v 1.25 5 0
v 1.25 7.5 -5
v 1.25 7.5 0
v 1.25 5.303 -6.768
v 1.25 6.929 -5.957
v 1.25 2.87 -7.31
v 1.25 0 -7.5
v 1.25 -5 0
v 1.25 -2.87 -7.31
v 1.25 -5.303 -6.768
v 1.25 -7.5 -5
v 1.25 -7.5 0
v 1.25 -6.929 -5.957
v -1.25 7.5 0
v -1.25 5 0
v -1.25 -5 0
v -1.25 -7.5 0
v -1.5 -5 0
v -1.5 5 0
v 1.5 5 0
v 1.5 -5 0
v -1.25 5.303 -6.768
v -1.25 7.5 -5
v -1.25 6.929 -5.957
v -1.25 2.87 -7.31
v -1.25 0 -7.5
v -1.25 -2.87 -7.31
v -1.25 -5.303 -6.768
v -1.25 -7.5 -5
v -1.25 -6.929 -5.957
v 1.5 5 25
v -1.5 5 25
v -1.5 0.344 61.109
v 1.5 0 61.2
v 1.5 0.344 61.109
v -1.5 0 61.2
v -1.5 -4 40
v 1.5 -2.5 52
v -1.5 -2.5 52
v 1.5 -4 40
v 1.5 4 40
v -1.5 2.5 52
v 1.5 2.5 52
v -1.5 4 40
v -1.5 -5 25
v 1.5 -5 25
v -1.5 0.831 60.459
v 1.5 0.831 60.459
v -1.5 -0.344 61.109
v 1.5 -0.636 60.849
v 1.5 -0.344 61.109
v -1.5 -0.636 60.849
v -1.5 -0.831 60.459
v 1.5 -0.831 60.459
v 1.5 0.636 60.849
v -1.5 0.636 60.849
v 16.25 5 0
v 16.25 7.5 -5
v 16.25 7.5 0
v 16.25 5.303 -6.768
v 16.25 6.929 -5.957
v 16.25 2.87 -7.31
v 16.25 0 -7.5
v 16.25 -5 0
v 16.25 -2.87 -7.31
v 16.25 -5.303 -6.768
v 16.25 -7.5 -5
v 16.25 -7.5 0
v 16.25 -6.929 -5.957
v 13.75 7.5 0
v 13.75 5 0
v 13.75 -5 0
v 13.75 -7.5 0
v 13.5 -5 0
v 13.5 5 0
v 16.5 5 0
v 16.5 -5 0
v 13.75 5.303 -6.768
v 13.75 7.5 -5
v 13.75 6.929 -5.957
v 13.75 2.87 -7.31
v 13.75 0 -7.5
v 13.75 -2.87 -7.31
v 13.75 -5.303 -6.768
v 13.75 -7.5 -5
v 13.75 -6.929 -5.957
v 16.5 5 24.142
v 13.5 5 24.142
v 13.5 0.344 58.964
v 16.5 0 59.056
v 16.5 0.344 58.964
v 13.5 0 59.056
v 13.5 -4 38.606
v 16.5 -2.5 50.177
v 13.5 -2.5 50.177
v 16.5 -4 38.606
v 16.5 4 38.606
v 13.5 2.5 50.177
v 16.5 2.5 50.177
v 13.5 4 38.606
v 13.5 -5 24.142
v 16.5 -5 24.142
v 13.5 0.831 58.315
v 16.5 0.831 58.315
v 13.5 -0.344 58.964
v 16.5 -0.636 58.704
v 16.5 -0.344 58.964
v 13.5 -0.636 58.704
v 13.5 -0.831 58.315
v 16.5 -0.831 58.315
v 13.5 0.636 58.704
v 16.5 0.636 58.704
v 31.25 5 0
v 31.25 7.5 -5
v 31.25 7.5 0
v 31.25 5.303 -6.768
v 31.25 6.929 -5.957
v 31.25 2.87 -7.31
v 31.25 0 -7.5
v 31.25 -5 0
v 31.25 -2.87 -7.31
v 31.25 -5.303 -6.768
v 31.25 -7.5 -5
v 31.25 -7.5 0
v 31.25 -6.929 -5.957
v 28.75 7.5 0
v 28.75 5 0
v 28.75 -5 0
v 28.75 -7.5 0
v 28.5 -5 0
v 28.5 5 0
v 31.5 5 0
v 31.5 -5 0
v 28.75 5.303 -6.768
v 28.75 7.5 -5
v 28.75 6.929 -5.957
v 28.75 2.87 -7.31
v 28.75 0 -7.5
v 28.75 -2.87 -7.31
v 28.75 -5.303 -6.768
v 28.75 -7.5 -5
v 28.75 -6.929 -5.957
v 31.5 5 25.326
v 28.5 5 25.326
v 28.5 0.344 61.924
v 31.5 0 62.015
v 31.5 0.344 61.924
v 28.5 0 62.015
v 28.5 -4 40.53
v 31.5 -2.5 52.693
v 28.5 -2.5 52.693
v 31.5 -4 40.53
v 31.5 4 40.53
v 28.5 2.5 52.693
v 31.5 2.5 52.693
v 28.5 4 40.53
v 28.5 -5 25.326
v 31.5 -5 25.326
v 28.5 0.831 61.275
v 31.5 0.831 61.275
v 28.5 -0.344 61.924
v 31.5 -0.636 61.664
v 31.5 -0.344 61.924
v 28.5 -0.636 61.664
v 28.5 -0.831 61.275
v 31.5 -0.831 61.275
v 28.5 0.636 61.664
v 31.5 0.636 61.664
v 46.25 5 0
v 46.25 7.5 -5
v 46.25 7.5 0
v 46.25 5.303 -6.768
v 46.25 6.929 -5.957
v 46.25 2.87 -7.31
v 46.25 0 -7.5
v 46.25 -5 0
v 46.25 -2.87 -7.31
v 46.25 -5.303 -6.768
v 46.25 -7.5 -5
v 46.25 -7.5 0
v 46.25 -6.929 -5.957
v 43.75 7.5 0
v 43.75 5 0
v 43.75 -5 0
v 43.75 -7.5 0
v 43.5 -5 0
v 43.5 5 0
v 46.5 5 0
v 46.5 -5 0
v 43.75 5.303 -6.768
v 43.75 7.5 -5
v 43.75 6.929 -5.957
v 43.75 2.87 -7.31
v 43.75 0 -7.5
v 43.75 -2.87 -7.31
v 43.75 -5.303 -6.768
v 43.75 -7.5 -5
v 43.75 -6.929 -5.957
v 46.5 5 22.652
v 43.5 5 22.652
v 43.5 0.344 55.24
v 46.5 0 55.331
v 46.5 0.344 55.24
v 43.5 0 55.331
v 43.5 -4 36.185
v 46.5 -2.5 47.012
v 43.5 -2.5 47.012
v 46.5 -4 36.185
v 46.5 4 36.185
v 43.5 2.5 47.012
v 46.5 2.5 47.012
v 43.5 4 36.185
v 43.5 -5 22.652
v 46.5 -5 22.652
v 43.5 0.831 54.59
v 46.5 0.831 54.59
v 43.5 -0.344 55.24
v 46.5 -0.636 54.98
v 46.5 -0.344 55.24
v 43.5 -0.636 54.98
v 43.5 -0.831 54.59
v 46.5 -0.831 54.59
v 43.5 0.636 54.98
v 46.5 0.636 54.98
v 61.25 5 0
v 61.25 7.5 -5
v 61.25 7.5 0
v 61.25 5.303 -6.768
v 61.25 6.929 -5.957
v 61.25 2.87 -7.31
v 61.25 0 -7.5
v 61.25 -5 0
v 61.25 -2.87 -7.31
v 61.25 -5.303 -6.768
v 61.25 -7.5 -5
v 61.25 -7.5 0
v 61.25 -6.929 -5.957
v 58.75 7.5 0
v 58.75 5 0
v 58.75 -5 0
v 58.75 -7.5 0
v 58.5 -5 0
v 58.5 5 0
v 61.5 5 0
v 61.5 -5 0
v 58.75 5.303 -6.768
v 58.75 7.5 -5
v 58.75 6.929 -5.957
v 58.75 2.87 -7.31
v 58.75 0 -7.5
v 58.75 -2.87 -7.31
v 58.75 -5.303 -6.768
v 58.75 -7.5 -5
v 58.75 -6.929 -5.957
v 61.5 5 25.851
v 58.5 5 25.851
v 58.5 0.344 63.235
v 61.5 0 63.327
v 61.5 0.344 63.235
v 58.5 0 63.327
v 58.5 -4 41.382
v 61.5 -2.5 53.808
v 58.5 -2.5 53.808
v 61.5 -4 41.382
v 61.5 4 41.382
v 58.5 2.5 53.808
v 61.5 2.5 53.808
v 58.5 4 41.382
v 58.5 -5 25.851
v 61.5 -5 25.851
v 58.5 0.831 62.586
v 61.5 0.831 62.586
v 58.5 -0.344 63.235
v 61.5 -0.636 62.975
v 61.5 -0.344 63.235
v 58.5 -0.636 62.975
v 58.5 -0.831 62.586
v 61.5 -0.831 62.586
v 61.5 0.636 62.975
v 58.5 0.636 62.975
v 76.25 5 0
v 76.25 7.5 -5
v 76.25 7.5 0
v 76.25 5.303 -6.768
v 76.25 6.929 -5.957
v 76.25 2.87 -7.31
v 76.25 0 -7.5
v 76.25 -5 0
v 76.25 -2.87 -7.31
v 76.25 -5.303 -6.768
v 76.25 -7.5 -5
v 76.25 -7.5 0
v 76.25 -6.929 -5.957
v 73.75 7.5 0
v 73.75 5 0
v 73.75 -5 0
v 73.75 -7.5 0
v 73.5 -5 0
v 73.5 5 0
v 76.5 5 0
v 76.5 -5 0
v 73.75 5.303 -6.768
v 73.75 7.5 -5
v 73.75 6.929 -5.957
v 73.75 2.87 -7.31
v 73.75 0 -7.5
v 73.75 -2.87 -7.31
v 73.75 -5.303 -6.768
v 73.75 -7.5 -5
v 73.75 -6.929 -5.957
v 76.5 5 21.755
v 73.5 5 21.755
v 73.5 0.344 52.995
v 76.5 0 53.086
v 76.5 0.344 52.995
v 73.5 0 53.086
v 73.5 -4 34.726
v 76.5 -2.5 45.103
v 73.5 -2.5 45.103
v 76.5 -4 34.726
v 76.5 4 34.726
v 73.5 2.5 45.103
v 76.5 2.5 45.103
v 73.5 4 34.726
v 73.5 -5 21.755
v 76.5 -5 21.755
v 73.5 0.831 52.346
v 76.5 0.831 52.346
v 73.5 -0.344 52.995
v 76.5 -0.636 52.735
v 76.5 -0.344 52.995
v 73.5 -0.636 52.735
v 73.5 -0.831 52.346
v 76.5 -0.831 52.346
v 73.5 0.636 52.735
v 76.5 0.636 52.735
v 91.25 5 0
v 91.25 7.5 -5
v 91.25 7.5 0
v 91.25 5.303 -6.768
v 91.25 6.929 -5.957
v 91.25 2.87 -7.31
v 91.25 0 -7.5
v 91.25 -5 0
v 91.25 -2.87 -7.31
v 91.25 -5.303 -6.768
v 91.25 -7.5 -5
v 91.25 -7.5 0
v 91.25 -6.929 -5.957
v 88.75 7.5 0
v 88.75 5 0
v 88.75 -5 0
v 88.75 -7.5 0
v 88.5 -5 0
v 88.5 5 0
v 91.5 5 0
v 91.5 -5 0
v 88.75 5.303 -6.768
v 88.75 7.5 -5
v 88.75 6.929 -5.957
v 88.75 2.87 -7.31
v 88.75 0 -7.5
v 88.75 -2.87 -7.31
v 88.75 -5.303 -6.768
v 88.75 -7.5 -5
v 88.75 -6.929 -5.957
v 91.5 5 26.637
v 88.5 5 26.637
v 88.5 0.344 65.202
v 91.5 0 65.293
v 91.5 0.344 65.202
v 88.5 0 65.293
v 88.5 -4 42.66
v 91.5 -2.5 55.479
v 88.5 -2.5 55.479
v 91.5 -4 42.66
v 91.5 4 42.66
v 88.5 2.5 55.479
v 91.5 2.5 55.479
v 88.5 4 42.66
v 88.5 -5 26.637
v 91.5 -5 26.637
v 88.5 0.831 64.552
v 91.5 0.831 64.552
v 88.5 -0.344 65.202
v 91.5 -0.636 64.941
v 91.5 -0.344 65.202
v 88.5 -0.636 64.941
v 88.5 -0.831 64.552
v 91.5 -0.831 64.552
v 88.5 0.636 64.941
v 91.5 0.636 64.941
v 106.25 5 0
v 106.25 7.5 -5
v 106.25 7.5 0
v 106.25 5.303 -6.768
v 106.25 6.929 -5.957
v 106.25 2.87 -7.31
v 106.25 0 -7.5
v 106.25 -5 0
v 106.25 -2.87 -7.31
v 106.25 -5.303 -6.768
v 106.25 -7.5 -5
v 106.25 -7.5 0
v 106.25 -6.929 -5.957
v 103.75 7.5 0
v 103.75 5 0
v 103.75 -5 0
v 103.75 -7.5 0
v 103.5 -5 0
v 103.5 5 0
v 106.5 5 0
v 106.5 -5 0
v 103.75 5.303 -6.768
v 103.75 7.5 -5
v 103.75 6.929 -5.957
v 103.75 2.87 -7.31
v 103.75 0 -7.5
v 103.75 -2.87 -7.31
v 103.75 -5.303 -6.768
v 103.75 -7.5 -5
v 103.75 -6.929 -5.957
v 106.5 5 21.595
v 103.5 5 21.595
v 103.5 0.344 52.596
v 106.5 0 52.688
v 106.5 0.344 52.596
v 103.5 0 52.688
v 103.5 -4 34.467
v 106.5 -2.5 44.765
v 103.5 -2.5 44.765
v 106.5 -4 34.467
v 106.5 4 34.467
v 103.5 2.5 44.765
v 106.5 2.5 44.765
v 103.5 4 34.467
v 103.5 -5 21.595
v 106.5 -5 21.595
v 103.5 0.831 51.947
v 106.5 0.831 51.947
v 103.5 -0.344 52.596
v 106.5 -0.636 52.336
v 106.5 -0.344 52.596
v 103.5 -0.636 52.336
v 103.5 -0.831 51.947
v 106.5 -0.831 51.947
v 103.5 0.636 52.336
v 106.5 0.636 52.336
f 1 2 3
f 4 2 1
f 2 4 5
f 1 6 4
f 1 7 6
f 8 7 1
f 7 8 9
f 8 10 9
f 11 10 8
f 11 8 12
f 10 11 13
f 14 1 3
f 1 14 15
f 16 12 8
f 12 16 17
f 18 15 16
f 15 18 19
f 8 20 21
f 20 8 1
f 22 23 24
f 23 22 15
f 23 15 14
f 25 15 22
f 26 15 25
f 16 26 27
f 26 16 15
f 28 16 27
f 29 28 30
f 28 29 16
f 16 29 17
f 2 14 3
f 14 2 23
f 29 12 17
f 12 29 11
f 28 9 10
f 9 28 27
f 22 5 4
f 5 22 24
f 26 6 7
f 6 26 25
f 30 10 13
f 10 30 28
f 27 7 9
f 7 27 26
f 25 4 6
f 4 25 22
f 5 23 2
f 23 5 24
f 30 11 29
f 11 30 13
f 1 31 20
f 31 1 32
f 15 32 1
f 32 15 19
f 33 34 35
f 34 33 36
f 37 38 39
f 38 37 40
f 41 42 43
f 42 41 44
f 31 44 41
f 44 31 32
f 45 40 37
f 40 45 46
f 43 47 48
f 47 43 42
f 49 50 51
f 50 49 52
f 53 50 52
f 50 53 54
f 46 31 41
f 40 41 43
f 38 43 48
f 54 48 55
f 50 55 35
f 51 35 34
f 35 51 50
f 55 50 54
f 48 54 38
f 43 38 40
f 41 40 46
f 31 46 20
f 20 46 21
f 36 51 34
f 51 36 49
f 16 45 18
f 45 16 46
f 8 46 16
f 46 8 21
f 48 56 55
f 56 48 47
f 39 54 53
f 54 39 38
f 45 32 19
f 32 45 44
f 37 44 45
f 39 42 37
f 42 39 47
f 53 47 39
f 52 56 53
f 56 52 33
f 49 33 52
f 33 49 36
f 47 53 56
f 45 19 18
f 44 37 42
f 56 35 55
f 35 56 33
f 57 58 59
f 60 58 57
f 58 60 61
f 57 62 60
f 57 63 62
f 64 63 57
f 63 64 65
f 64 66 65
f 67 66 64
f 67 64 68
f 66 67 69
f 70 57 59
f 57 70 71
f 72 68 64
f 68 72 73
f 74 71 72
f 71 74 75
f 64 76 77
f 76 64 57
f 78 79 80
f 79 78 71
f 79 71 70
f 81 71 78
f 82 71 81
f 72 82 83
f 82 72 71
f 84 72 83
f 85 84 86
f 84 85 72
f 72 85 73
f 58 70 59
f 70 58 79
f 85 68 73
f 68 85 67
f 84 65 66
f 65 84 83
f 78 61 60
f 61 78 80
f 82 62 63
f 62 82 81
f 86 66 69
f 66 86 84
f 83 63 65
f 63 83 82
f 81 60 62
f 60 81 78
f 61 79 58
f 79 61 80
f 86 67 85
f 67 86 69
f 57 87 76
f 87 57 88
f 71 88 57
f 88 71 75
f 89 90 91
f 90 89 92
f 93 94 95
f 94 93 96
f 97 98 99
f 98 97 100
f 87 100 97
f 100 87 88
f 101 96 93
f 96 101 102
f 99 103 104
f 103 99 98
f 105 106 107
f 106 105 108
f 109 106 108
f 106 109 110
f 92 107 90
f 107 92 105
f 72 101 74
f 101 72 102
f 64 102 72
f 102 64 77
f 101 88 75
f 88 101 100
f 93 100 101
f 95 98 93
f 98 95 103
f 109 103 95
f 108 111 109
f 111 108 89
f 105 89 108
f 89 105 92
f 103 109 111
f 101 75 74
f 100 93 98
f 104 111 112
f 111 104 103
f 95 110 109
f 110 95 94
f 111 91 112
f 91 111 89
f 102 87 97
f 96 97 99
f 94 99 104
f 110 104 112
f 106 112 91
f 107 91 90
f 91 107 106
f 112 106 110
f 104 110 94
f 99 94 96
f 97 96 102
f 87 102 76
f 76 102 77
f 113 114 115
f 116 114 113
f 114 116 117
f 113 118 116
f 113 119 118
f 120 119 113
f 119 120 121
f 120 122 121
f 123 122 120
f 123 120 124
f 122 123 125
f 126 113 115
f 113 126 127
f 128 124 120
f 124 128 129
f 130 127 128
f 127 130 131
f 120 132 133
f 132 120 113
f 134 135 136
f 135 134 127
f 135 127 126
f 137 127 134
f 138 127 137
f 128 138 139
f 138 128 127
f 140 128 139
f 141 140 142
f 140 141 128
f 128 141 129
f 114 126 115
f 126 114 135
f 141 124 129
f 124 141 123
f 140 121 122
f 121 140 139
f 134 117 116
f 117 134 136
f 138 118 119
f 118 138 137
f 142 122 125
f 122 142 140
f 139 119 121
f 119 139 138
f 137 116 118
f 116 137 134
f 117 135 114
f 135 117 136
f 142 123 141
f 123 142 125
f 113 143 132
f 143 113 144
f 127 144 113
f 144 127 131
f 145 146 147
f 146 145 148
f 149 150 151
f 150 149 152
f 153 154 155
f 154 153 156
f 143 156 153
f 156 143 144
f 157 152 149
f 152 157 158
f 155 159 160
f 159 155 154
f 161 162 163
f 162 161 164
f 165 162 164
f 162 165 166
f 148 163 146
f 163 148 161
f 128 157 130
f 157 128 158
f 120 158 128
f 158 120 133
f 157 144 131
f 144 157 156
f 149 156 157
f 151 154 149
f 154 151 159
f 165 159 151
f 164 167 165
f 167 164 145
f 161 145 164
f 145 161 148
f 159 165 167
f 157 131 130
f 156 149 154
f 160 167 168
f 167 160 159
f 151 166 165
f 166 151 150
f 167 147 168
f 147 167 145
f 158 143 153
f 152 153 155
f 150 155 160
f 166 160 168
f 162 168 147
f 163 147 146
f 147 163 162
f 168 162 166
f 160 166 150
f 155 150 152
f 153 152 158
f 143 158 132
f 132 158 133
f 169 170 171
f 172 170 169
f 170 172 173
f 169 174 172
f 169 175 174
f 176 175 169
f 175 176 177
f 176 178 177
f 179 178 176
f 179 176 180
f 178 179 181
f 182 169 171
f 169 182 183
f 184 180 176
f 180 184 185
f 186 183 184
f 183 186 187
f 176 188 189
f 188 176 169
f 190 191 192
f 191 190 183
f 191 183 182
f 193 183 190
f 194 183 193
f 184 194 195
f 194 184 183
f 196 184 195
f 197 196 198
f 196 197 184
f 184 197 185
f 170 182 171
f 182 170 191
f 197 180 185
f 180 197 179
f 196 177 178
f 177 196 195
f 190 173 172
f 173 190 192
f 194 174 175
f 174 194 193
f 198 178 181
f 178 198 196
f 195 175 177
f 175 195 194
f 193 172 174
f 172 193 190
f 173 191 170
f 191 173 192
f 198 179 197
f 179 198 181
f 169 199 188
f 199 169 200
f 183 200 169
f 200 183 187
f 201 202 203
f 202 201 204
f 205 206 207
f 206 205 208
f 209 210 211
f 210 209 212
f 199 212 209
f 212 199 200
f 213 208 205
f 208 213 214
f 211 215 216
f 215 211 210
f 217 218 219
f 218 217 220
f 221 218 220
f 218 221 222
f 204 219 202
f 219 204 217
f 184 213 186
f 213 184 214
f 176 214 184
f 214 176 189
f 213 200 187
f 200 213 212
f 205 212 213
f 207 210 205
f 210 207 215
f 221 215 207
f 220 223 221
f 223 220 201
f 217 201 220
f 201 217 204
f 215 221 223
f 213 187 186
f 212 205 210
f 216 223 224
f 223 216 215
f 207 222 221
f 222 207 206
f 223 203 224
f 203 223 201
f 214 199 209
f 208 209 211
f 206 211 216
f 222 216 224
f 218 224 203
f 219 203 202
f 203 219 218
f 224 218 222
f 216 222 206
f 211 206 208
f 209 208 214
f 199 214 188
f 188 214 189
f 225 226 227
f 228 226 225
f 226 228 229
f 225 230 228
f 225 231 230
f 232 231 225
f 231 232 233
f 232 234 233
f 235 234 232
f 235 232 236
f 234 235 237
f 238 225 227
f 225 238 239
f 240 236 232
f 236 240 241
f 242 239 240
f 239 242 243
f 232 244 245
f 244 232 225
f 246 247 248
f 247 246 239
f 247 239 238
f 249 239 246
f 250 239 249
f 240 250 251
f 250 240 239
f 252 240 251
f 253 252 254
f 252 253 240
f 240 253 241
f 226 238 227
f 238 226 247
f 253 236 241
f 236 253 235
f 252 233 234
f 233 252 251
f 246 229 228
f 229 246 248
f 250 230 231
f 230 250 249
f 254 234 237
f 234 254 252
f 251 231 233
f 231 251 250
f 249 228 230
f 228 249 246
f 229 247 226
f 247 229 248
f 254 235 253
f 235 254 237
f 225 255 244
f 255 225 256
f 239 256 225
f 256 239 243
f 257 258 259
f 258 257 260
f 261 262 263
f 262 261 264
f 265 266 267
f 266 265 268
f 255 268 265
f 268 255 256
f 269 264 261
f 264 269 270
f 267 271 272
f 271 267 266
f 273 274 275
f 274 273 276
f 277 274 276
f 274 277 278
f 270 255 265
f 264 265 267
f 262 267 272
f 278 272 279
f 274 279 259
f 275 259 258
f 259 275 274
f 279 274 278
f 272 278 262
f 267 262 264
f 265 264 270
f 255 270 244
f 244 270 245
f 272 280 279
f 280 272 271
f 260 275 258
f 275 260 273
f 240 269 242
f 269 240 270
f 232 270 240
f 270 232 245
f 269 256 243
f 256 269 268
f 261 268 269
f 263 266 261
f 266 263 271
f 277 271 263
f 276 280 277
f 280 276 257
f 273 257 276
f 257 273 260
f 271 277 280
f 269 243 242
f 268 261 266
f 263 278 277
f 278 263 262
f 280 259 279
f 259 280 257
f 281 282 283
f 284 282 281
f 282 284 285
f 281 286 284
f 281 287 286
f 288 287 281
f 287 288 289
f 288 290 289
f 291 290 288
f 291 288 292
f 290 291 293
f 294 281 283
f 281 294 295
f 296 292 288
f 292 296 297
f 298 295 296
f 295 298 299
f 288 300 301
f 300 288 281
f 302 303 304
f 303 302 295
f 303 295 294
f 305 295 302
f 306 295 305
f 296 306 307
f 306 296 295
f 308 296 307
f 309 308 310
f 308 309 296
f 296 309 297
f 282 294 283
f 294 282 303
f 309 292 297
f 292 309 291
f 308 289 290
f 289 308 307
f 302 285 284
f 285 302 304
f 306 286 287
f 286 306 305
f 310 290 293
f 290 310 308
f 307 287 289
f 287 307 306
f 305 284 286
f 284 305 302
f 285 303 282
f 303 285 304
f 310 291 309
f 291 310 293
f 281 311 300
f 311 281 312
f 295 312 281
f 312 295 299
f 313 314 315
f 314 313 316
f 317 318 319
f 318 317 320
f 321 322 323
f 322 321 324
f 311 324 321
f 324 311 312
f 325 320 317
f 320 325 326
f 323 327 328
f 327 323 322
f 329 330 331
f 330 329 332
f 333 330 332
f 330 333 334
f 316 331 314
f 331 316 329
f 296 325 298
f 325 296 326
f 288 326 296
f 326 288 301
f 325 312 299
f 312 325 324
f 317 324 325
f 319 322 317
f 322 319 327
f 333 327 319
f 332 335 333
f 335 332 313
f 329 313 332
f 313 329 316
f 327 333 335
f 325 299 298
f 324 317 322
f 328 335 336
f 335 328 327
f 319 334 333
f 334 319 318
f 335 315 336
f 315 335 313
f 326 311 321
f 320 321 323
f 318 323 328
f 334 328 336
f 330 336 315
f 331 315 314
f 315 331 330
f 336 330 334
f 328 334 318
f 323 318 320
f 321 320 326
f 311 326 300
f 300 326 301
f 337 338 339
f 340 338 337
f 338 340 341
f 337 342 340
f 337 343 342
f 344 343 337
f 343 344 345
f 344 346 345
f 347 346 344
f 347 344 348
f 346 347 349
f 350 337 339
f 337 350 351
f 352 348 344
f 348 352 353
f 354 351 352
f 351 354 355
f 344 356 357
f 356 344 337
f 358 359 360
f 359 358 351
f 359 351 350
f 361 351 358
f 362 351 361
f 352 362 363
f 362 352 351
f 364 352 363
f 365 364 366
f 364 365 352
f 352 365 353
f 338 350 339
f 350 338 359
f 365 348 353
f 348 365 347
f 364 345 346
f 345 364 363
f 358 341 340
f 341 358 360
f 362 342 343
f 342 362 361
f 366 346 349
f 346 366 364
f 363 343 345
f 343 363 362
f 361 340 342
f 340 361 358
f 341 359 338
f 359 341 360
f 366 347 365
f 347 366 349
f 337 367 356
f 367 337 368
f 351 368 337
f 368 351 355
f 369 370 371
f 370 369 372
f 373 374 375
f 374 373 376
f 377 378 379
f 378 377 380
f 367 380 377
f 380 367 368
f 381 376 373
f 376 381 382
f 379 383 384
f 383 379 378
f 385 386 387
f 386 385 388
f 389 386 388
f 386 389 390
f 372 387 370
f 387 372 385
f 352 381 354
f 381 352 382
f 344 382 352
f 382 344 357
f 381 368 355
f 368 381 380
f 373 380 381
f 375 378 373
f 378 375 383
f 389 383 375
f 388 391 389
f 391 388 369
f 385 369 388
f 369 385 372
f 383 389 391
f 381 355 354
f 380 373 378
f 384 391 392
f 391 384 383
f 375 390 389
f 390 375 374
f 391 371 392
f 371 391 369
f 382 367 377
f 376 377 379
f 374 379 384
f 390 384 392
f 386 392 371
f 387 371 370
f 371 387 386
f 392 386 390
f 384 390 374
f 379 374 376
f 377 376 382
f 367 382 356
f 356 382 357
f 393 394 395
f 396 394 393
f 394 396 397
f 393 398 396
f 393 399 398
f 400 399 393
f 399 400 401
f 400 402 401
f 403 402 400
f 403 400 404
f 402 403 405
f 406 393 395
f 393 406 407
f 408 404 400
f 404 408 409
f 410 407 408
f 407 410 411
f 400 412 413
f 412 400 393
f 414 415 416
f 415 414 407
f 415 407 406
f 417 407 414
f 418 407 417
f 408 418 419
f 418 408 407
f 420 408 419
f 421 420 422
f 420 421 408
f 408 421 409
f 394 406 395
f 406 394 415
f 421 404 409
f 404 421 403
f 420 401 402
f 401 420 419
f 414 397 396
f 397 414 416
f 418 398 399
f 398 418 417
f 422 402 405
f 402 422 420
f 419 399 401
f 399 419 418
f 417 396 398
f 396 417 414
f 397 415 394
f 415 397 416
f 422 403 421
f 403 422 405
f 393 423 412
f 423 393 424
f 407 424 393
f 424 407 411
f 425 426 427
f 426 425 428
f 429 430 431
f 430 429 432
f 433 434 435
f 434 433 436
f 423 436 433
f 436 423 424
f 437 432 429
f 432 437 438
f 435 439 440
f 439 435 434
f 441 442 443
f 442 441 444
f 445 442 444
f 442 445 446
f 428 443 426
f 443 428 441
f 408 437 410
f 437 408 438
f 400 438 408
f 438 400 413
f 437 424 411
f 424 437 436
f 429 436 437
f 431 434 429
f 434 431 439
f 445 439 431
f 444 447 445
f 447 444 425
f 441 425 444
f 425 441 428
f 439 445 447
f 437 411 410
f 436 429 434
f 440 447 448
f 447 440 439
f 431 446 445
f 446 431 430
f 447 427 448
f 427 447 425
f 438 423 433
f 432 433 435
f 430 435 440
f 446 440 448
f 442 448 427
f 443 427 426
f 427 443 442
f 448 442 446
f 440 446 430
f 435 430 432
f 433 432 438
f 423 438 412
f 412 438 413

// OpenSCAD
/*
 * SLAT - Thin Wave Element with Cam Follower
 *
 * GEOMETRY:
 * - Main body: Thin wave shape (symmetric, centered on Y)
 * - Follower: Pad at bottom that rides ON TOP of cam
 * - NO guidance tabs - slats self-align through:
 *   - Overlap with adjacent layers
 *   - Cam contact (gravity holds them down)
 *   - Cam end caps (prevent X drift)
 *
 * ORIENTATION (looking from front, -Y toward +Y):
 * - Slat body centered at Y = 0
 * - Follower extends DOWN from slat bottom (contacts cam top)
 *
 * Print: 36x per layer (108 total for 3 layers)
 * Orientation: Upright
 */

include <../common.scad>

$fn = 32;

// ============================================
// MAIN SLAT MODULE
// ============================================

module slat(height = SLAT_BASE_HEIGHT) {
    union() {
        // Main visible wave body
        wave_body(height);

        // Cam follower (bottom, rides on cam)
        cam_follower();
    }
}

// ============================================
// WAVE BODY - Thin symmetric profile
// ============================================

module wave_body(height) {
    // Thin symmetric wave shape - allows layer overlap
    hull() {
        // Base (Z = 0 is bottom of visible slat) - full depth, centered
        translate([-SLAT_THICKNESS/2, -SLAT_DEPTH/2, 0])
            cube([SLAT_THICKNESS, SLAT_DEPTH, 1]);

        // Lower body - maintains depth
        translate([-SLAT_THICKNESS/2, -SLAT_DEPTH/2, height * 0.4])
            cube([SLAT_THICKNESS, SLAT_DEPTH, 1]);

        // Middle taper - 80% depth, CENTERED
        translate([-SLAT_THICKNESS/2, -SLAT_DEPTH * 0.4, height * 0.65])
            cube([SLAT_THICKNESS, SLAT_DEPTH * 0.8, 1]);

        // Upper taper - 50% depth, CENTERED
        translate([-SLAT_THICKNESS/2, -SLAT_DEPTH * 0.25, height * 0.85])
            cube([SLAT_THICKNESS, SLAT_DEPTH * 0.5, 1]);

        // Crest (rounded dome top) - centered
        translate([0, 0, height])
        scale([1, 0.3, 0.4])
        rotate([0, 90, 0])
            cylinder(d = 6, h = SLAT_THICKNESS, center = true, $fn = 16);
    }
}

// ============================================
// CAM FOLLOWER - Rides on top of cam
// ============================================

module cam_follower() {
    // Follower pad extends DOWN from slat bottom
    // It contacts the TOP surface of the rotating cam

    // Follower centered in Y to contact cam at slat's Y position
    translate([-FOLLOWER_WIDTH/2, -FOLLOWER_LENGTH/2, -FOLLOWER_HEIGHT])
        cube([FOLLOWER_WIDTH, FOLLOWER_LENGTH, FOLLOWER_HEIGHT]);

    // Rounded bottom edge for smooth cam contact
    translate([0, 0, -FOLLOWER_HEIGHT])
    rotate([0, 90, 0])
    scale([1, FOLLOWER_LENGTH/FOLLOWER_HEIGHT, 1])
        cylinder(d = FOLLOWER_HEIGHT, h = FOLLOWER_WIDTH, center = true, $fn = 16);
}

// ============================================
// SLAT FOR SPECIFIC INDEX
// ============================================

module slat_i(i) {
    slat(slat_height(i));
}

// ============================================
// RENDER - Display sample slats showing height variation
// ============================================

// Show slats with golden ratio heights
echo("=== SAMPLE SLAT HEIGHTS (Golden Ratio) ===");
for (i = [0 : 7]) {
    h = slat_height(i * 4);
    echo(str("  Slat ", i*4, ": height = ", h, "mm"));

    translate([i * 15, 0, 0])
    color(slat_color(i * 4))
        slat(h);
}

// ============================================
// VERIFICATION
// ============================================

echo("");
echo("=== SLAT VERIFICATION ===");
echo(str("Body: ", SLAT_THICKNESS, " x ", SLAT_DEPTH, " x ", SLAT_BASE_HEIGHT, "-", SLAT_BASE_HEIGHT + SLAT_HEIGHT_VAR, "mm"));
echo(str("Follower: ", FOLLOWER_WIDTH, " x ", FOLLOWER_LENGTH, " x ", FOLLOWER_HEIGHT, "mm"));
echo("");
echo("GUIDANCE: Self-aligning (no mechanical guides)");
echo("  - Layer overlap constrains Y");
echo("  - Cam contact + gravity constrains Z");
echo("  - Cam end caps constrain X");
